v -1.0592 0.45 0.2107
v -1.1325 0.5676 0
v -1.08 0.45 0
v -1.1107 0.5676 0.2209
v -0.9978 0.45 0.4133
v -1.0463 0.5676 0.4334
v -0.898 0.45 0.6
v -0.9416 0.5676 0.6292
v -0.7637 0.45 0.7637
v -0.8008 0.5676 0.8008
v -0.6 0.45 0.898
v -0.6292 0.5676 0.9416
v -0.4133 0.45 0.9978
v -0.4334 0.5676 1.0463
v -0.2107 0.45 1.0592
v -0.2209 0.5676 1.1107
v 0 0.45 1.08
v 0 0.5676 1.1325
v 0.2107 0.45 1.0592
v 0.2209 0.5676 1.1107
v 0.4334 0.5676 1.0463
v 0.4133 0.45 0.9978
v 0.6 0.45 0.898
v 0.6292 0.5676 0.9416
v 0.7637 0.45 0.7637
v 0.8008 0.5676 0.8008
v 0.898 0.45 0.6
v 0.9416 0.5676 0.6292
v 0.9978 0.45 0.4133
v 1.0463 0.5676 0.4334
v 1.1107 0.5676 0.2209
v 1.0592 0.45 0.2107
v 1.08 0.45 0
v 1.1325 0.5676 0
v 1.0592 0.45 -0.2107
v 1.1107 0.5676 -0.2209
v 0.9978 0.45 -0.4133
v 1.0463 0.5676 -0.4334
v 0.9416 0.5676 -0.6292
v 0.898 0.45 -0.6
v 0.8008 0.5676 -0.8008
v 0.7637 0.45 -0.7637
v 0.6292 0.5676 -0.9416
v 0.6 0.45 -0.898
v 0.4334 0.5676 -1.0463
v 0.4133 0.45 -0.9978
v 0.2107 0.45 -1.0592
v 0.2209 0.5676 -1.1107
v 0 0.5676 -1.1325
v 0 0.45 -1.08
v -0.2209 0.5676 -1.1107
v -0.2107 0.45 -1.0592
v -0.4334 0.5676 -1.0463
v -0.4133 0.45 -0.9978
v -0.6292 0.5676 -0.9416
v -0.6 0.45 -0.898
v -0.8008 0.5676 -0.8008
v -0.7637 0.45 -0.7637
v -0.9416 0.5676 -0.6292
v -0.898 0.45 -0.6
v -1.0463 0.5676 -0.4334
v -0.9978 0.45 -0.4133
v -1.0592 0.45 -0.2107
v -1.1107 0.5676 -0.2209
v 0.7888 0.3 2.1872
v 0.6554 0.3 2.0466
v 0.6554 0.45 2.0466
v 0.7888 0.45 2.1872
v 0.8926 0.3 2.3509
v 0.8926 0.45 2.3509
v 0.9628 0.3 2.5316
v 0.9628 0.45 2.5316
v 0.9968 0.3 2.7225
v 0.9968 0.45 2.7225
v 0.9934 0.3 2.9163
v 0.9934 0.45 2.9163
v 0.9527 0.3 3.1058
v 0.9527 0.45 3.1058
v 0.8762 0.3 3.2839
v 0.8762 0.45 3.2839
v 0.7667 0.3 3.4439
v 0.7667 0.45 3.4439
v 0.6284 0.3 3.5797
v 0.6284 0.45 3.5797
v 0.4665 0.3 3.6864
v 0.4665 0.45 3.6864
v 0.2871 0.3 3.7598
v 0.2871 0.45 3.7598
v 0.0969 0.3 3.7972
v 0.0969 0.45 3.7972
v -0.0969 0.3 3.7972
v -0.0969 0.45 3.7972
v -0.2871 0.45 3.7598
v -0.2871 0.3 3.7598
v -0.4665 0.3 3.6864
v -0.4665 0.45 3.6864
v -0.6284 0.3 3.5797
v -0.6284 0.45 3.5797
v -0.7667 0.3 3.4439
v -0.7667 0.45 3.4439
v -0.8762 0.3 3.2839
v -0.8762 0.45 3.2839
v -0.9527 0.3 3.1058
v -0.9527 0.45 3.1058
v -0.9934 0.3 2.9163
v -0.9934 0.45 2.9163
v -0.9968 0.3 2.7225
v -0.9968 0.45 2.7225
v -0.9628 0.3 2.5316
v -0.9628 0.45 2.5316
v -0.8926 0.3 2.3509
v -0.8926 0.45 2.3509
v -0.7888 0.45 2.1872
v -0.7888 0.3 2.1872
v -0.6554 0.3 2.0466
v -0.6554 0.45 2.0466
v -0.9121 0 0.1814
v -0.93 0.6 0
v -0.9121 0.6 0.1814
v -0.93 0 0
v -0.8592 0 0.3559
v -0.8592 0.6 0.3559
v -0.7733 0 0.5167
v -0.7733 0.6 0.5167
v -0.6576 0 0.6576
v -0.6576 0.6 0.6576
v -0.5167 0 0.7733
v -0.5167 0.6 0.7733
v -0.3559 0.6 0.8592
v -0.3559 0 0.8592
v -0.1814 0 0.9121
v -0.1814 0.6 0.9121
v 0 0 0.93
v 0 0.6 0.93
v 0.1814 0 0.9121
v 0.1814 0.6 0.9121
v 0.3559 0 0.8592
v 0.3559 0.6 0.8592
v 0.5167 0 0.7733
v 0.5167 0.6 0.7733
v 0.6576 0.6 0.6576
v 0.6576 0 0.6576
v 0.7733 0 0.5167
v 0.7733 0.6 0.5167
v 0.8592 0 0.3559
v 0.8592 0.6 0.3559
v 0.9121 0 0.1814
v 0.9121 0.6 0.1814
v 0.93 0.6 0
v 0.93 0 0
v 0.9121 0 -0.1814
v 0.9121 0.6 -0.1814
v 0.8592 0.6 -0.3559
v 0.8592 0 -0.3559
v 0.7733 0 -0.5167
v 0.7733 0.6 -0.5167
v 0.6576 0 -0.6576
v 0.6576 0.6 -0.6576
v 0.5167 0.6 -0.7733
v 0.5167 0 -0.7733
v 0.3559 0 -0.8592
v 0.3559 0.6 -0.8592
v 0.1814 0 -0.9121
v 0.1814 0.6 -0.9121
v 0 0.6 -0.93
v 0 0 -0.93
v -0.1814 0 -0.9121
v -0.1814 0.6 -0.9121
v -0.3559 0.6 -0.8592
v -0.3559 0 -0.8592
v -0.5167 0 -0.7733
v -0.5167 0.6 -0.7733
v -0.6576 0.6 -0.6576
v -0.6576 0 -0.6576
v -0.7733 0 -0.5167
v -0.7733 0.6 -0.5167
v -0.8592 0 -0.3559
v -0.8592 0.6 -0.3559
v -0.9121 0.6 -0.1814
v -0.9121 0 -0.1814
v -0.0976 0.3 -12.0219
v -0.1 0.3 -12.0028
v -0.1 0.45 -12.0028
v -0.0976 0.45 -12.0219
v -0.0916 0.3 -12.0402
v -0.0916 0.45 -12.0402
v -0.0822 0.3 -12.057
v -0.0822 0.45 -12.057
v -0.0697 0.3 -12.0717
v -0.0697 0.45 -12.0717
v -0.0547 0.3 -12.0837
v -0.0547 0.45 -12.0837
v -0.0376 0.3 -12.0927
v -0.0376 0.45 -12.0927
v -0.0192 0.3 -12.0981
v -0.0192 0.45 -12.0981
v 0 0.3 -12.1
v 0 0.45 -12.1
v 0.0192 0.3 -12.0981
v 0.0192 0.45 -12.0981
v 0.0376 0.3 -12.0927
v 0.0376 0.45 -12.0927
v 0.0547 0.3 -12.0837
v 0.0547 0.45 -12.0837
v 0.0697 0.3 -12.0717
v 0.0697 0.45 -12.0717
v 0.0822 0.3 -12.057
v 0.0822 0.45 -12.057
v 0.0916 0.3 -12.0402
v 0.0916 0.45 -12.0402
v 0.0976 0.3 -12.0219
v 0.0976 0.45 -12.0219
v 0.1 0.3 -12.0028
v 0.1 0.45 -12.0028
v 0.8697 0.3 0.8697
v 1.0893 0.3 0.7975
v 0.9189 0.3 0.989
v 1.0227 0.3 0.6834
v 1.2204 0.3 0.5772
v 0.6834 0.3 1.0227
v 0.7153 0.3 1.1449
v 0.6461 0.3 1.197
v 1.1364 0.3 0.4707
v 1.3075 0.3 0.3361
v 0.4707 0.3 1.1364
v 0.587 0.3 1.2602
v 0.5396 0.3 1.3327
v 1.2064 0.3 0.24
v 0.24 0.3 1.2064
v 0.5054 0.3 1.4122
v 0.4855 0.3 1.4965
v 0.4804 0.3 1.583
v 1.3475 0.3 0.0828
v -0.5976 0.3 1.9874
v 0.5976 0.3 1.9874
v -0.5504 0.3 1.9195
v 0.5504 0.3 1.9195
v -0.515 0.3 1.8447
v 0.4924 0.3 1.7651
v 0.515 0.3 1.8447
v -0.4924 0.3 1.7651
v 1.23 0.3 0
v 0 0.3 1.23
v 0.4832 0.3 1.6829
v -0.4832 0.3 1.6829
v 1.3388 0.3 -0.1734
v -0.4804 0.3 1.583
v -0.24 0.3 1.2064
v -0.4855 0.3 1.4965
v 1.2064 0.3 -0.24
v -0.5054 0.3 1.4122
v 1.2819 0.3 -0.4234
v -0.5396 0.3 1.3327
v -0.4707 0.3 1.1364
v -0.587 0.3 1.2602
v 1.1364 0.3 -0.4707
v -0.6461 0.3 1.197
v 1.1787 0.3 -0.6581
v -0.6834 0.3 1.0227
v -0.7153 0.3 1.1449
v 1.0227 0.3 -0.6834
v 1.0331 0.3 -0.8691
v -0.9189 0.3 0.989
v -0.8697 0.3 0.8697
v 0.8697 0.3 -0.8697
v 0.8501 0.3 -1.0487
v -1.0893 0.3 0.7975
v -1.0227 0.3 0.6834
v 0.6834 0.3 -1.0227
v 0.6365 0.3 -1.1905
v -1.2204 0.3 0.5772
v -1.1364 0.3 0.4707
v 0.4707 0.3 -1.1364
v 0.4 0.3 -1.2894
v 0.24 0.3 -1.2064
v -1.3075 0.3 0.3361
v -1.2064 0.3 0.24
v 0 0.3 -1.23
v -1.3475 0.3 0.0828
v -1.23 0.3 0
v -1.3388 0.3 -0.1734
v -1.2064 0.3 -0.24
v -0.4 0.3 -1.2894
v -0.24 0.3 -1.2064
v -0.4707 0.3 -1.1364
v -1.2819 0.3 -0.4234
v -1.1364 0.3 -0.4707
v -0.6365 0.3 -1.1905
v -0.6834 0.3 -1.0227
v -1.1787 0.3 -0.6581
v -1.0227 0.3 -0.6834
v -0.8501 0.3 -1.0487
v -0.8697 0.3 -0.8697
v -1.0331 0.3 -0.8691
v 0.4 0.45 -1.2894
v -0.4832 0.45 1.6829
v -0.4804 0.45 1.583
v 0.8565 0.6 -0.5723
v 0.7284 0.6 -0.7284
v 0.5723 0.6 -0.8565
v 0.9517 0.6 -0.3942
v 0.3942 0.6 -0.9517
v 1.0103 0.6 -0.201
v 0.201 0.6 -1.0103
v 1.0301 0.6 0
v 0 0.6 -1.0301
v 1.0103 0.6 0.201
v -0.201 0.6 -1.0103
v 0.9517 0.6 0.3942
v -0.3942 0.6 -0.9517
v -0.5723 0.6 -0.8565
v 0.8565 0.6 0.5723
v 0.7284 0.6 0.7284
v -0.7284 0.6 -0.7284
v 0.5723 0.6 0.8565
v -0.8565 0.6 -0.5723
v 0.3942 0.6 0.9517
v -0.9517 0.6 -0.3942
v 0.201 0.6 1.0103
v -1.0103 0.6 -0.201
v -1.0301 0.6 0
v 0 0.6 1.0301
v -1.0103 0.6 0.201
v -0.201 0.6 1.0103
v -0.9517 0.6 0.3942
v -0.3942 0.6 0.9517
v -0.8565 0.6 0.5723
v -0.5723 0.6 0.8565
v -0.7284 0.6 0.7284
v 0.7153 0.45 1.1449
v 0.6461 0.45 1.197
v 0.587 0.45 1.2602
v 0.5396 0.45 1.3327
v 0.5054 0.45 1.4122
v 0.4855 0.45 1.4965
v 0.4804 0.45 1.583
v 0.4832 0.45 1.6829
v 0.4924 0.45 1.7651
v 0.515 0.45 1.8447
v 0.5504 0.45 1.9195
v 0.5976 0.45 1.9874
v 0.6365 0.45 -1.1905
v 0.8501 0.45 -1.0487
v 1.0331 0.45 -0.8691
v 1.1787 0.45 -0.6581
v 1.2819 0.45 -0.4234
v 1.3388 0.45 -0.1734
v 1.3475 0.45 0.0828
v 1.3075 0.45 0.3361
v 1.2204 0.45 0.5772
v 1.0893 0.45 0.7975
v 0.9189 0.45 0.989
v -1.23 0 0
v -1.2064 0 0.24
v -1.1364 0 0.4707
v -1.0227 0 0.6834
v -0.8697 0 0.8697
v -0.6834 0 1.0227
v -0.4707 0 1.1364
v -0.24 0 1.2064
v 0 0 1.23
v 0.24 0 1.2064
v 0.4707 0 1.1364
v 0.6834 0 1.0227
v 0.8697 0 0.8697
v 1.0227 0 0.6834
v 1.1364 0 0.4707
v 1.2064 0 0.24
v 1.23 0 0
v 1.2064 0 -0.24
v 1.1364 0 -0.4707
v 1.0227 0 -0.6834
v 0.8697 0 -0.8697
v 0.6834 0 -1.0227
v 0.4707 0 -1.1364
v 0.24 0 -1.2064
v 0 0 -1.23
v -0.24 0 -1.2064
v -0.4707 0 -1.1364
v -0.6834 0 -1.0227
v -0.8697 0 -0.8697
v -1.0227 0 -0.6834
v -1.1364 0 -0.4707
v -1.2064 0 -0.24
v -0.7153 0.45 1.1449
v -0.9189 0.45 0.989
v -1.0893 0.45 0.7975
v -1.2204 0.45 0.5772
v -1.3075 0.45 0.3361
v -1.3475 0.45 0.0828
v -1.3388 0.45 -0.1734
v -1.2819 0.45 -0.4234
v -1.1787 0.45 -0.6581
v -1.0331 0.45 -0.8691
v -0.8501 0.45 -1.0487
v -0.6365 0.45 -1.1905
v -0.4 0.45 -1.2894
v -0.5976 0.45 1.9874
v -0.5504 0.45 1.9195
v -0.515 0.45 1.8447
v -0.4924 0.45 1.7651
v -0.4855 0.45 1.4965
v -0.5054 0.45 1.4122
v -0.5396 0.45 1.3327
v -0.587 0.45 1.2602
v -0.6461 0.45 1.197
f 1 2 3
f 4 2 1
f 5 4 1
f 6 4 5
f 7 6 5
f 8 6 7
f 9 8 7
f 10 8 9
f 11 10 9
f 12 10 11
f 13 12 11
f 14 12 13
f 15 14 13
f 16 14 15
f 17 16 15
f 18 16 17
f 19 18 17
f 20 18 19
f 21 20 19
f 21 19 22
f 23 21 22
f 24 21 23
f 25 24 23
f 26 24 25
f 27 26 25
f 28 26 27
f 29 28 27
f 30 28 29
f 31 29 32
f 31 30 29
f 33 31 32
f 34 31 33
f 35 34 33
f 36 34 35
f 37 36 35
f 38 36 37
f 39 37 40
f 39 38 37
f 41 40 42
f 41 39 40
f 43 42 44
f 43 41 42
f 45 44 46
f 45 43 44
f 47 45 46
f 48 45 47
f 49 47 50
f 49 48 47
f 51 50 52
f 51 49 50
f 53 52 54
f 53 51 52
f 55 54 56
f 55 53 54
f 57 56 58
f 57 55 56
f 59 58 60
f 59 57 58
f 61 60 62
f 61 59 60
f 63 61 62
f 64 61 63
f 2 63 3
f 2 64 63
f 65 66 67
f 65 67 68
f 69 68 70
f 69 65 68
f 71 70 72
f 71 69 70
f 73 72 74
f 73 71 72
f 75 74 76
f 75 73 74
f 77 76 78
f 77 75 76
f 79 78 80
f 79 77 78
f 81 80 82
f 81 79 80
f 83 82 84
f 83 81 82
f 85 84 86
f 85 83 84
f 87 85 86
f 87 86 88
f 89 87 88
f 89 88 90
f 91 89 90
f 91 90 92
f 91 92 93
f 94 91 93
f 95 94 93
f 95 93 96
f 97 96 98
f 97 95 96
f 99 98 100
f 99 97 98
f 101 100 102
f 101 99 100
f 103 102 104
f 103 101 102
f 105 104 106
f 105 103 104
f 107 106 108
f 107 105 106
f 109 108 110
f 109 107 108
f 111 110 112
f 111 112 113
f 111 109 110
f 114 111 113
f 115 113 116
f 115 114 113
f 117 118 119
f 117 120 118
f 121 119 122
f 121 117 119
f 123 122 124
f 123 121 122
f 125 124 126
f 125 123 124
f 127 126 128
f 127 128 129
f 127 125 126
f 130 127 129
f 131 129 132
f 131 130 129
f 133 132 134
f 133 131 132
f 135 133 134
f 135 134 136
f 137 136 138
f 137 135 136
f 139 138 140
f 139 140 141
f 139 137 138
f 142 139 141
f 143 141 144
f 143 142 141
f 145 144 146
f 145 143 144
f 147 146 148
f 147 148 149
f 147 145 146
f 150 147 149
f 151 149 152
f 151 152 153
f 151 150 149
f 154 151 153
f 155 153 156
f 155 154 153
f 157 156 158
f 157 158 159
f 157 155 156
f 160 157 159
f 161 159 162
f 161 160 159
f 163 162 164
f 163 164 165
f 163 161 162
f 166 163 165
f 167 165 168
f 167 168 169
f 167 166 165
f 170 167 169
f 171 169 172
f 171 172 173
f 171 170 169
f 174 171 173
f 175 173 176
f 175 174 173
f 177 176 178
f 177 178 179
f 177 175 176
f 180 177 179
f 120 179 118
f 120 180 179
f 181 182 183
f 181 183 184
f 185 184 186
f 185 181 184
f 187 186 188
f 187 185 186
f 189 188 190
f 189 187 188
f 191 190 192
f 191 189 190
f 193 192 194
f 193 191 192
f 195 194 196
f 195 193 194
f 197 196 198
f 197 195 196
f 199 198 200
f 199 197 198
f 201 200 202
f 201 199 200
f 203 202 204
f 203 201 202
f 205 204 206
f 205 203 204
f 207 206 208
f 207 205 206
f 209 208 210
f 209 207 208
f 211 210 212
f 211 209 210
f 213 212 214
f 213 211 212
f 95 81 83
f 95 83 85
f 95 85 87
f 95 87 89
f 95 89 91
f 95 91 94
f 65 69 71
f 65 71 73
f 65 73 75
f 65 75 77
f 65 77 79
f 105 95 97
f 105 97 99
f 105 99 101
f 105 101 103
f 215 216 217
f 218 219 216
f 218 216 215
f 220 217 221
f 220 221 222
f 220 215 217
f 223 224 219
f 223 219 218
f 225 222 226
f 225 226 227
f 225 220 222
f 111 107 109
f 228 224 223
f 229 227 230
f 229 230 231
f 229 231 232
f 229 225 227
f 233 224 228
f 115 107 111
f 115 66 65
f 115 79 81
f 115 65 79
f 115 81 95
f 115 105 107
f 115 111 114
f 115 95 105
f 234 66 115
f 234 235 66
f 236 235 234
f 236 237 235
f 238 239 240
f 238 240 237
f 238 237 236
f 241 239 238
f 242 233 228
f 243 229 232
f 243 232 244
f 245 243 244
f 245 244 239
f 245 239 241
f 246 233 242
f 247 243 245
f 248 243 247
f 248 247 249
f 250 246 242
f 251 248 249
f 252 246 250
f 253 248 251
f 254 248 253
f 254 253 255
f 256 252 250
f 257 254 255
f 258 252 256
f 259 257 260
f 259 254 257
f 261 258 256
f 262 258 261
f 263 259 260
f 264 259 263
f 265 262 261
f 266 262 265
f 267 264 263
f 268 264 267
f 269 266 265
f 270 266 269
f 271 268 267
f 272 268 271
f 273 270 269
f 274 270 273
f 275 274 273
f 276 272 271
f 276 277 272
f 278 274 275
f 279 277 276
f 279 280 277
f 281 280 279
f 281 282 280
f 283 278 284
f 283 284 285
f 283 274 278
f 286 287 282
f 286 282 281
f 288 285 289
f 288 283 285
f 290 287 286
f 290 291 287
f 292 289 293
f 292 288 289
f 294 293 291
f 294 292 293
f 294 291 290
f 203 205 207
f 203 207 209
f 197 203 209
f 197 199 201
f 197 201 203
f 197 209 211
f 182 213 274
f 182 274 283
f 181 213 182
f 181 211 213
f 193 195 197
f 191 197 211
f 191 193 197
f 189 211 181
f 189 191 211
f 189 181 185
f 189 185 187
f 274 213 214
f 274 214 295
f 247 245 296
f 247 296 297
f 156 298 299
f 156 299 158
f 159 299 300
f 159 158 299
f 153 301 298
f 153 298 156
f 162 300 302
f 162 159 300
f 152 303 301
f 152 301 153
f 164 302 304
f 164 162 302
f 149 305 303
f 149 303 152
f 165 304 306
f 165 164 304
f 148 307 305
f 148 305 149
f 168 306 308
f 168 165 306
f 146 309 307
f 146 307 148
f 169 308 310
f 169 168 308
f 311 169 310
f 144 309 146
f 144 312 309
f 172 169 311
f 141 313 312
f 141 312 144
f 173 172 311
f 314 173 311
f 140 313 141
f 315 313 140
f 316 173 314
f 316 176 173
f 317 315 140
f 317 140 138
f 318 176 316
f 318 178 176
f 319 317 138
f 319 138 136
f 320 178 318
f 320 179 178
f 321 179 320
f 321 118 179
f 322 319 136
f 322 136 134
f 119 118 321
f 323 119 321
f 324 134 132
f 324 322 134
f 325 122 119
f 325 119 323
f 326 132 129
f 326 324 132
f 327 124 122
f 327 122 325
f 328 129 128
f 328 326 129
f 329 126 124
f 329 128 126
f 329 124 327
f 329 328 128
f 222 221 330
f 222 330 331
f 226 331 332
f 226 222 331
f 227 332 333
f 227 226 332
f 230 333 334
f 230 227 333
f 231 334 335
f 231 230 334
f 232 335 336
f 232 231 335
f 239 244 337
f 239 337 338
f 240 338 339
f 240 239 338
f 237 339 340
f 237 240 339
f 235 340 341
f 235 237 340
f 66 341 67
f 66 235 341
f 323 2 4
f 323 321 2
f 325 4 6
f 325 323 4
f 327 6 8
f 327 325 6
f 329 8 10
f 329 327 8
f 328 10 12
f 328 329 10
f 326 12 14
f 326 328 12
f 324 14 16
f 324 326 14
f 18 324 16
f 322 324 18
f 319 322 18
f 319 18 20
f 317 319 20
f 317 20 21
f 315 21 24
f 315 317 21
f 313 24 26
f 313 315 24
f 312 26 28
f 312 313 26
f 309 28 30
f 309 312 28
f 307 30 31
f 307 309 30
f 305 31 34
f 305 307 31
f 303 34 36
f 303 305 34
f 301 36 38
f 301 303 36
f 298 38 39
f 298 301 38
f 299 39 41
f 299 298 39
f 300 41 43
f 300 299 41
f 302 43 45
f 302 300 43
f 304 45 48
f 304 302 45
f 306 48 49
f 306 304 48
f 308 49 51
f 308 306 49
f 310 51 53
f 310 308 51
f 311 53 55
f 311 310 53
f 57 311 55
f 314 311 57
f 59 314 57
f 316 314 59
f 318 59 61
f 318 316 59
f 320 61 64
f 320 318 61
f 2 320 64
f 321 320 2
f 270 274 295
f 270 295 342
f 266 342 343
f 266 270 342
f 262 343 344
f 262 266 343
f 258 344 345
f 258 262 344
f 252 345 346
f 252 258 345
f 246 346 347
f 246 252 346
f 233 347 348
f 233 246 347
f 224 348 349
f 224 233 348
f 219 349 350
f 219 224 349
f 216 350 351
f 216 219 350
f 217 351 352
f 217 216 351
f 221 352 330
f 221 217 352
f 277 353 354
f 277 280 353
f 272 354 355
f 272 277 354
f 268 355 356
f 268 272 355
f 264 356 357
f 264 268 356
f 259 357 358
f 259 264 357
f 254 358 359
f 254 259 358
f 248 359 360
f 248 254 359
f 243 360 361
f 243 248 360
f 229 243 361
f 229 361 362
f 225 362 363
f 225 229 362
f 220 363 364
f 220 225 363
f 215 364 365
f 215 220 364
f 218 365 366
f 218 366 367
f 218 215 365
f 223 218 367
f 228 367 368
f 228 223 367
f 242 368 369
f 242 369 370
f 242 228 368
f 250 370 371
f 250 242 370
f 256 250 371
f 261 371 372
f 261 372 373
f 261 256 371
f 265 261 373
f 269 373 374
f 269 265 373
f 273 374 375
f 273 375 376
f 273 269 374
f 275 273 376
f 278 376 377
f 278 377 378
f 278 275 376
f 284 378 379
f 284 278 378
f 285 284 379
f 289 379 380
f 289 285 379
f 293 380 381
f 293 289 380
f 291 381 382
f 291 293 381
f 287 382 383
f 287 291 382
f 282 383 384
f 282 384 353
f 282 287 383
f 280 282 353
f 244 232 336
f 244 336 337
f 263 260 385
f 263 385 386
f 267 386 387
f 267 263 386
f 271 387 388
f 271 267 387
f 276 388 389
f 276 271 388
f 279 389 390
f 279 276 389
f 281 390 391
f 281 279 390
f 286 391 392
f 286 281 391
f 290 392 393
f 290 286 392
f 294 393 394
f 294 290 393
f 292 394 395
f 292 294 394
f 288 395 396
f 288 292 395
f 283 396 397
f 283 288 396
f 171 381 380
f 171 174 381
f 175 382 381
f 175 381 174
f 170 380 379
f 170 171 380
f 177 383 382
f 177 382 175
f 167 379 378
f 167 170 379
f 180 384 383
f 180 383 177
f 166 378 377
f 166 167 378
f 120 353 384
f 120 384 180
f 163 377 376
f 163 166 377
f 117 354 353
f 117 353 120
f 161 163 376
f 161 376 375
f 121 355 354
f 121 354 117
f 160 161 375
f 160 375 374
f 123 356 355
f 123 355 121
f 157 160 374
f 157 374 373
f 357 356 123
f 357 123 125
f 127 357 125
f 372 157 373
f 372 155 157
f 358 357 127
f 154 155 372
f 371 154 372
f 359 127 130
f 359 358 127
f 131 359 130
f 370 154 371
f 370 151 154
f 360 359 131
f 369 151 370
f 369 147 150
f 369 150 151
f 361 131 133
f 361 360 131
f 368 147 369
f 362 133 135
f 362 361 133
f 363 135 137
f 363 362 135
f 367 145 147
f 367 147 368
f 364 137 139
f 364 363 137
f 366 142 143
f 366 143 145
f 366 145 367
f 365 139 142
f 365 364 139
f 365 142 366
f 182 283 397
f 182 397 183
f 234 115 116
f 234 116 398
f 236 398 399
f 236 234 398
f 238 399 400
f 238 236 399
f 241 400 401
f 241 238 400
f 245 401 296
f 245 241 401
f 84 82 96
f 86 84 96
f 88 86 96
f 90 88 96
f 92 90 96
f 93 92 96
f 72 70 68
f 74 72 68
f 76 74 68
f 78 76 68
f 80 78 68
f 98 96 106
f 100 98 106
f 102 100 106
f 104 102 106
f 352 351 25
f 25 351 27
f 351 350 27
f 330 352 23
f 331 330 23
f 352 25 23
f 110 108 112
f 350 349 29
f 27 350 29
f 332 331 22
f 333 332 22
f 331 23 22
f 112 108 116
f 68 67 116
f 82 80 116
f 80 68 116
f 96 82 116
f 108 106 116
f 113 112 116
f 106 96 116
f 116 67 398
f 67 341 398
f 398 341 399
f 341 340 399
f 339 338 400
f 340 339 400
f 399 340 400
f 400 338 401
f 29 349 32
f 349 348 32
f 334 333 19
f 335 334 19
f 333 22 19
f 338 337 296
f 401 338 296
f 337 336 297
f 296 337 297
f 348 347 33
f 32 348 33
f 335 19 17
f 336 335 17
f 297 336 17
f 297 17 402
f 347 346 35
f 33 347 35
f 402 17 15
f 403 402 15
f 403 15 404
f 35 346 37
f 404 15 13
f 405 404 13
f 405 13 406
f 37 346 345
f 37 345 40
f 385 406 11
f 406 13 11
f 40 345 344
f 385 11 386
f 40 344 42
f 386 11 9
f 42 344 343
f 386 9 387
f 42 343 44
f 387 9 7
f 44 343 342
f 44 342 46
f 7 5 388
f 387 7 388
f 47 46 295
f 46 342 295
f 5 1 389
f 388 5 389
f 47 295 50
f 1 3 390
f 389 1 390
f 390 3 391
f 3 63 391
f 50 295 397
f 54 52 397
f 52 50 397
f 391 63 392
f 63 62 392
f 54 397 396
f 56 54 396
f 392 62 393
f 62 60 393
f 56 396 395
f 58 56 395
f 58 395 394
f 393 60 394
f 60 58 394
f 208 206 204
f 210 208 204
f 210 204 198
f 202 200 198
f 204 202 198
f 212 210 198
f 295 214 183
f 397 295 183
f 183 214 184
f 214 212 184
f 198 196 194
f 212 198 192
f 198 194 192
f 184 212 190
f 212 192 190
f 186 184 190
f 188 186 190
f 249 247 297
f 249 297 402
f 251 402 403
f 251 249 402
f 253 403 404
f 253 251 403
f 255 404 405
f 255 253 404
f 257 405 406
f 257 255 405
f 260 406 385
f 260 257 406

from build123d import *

# Parameters (mm, degrees)
ESQUISSE2_R        = 1.08
BOSS_EXTRU_1_DEPTH = 0.15


with BuildPart() as part:
    # Esquisse1 → Révolution1 (revolve)
    with BuildSketch(Plane.XY):
        Polygon((-1.23, 0), (-1.23, 0.3), (-1.08, 0.3), (-1.08, 0.45), (-1.13245676, 0.567603094), (-1.030107007, 0.6), (-0.93, 0.6), (-0.93, 0), align=None)
    revolve(axis=Axis((0, 0, 0), (0, 1, 0)))

    # Esquisse2 → Boss.-Extru.1 (add)
    with BuildSketch(Plane(origin=(0, 0.3, 0), x_dir=(1, 0, 0), z_dir=(0, 1, 0))):
        with BuildLine():
            Line((0.099960806, 12.002799494), (0.4, 1.289379696))
            ThreePointArc((0.4, 1.289379696), (1.338815312, 0.173417305), (0.715314881, -1.144912495))
            ThreePointArc((0.715314881, -1.144912495), (0.539593784, -1.332680285), (0.480442286, -1.582951632))
            Line((0.480442286, -1.582951632), (0.48324178, -1.682912439))
            ThreePointArc((0.48324178, -1.682912439), (0.531110798, -1.882818549), (0.655363875, -2.04657162))
            ThreePointArc((0.655363875, -2.04657162), (0, -3.801884927), (-0.655363875, -2.04657162))
            ThreePointArc((-0.655363875, -2.04657162), (-0.531110798, -1.882818549), (-0.48324178, -1.682912439))
            Line((-0.48324178, -1.682912439), (-0.480442286, -1.582951632))
            ThreePointArc((-0.480442286, -1.582951632), (-0.539593784, -1.332680285), (-0.715314881, -1.144912495))
            ThreePointArc((-0.715314881, -1.144912495), (-1.338815312, 0.173417305), (-0.4, 1.289379696))
            Line((-0.4, 1.289379696), (-0.099960806, 12.002799494))
            ThreePointArc((-0.099960806, 12.002799494), (0, 12.1), (0.099960806, 12.002799494))
        make_face()
        Circle(ESQUISSE2_R, mode=Mode.SUBTRACT)
    extrude(amount=BOSS_EXTRU_1_DEPTH)


solid = part.part
